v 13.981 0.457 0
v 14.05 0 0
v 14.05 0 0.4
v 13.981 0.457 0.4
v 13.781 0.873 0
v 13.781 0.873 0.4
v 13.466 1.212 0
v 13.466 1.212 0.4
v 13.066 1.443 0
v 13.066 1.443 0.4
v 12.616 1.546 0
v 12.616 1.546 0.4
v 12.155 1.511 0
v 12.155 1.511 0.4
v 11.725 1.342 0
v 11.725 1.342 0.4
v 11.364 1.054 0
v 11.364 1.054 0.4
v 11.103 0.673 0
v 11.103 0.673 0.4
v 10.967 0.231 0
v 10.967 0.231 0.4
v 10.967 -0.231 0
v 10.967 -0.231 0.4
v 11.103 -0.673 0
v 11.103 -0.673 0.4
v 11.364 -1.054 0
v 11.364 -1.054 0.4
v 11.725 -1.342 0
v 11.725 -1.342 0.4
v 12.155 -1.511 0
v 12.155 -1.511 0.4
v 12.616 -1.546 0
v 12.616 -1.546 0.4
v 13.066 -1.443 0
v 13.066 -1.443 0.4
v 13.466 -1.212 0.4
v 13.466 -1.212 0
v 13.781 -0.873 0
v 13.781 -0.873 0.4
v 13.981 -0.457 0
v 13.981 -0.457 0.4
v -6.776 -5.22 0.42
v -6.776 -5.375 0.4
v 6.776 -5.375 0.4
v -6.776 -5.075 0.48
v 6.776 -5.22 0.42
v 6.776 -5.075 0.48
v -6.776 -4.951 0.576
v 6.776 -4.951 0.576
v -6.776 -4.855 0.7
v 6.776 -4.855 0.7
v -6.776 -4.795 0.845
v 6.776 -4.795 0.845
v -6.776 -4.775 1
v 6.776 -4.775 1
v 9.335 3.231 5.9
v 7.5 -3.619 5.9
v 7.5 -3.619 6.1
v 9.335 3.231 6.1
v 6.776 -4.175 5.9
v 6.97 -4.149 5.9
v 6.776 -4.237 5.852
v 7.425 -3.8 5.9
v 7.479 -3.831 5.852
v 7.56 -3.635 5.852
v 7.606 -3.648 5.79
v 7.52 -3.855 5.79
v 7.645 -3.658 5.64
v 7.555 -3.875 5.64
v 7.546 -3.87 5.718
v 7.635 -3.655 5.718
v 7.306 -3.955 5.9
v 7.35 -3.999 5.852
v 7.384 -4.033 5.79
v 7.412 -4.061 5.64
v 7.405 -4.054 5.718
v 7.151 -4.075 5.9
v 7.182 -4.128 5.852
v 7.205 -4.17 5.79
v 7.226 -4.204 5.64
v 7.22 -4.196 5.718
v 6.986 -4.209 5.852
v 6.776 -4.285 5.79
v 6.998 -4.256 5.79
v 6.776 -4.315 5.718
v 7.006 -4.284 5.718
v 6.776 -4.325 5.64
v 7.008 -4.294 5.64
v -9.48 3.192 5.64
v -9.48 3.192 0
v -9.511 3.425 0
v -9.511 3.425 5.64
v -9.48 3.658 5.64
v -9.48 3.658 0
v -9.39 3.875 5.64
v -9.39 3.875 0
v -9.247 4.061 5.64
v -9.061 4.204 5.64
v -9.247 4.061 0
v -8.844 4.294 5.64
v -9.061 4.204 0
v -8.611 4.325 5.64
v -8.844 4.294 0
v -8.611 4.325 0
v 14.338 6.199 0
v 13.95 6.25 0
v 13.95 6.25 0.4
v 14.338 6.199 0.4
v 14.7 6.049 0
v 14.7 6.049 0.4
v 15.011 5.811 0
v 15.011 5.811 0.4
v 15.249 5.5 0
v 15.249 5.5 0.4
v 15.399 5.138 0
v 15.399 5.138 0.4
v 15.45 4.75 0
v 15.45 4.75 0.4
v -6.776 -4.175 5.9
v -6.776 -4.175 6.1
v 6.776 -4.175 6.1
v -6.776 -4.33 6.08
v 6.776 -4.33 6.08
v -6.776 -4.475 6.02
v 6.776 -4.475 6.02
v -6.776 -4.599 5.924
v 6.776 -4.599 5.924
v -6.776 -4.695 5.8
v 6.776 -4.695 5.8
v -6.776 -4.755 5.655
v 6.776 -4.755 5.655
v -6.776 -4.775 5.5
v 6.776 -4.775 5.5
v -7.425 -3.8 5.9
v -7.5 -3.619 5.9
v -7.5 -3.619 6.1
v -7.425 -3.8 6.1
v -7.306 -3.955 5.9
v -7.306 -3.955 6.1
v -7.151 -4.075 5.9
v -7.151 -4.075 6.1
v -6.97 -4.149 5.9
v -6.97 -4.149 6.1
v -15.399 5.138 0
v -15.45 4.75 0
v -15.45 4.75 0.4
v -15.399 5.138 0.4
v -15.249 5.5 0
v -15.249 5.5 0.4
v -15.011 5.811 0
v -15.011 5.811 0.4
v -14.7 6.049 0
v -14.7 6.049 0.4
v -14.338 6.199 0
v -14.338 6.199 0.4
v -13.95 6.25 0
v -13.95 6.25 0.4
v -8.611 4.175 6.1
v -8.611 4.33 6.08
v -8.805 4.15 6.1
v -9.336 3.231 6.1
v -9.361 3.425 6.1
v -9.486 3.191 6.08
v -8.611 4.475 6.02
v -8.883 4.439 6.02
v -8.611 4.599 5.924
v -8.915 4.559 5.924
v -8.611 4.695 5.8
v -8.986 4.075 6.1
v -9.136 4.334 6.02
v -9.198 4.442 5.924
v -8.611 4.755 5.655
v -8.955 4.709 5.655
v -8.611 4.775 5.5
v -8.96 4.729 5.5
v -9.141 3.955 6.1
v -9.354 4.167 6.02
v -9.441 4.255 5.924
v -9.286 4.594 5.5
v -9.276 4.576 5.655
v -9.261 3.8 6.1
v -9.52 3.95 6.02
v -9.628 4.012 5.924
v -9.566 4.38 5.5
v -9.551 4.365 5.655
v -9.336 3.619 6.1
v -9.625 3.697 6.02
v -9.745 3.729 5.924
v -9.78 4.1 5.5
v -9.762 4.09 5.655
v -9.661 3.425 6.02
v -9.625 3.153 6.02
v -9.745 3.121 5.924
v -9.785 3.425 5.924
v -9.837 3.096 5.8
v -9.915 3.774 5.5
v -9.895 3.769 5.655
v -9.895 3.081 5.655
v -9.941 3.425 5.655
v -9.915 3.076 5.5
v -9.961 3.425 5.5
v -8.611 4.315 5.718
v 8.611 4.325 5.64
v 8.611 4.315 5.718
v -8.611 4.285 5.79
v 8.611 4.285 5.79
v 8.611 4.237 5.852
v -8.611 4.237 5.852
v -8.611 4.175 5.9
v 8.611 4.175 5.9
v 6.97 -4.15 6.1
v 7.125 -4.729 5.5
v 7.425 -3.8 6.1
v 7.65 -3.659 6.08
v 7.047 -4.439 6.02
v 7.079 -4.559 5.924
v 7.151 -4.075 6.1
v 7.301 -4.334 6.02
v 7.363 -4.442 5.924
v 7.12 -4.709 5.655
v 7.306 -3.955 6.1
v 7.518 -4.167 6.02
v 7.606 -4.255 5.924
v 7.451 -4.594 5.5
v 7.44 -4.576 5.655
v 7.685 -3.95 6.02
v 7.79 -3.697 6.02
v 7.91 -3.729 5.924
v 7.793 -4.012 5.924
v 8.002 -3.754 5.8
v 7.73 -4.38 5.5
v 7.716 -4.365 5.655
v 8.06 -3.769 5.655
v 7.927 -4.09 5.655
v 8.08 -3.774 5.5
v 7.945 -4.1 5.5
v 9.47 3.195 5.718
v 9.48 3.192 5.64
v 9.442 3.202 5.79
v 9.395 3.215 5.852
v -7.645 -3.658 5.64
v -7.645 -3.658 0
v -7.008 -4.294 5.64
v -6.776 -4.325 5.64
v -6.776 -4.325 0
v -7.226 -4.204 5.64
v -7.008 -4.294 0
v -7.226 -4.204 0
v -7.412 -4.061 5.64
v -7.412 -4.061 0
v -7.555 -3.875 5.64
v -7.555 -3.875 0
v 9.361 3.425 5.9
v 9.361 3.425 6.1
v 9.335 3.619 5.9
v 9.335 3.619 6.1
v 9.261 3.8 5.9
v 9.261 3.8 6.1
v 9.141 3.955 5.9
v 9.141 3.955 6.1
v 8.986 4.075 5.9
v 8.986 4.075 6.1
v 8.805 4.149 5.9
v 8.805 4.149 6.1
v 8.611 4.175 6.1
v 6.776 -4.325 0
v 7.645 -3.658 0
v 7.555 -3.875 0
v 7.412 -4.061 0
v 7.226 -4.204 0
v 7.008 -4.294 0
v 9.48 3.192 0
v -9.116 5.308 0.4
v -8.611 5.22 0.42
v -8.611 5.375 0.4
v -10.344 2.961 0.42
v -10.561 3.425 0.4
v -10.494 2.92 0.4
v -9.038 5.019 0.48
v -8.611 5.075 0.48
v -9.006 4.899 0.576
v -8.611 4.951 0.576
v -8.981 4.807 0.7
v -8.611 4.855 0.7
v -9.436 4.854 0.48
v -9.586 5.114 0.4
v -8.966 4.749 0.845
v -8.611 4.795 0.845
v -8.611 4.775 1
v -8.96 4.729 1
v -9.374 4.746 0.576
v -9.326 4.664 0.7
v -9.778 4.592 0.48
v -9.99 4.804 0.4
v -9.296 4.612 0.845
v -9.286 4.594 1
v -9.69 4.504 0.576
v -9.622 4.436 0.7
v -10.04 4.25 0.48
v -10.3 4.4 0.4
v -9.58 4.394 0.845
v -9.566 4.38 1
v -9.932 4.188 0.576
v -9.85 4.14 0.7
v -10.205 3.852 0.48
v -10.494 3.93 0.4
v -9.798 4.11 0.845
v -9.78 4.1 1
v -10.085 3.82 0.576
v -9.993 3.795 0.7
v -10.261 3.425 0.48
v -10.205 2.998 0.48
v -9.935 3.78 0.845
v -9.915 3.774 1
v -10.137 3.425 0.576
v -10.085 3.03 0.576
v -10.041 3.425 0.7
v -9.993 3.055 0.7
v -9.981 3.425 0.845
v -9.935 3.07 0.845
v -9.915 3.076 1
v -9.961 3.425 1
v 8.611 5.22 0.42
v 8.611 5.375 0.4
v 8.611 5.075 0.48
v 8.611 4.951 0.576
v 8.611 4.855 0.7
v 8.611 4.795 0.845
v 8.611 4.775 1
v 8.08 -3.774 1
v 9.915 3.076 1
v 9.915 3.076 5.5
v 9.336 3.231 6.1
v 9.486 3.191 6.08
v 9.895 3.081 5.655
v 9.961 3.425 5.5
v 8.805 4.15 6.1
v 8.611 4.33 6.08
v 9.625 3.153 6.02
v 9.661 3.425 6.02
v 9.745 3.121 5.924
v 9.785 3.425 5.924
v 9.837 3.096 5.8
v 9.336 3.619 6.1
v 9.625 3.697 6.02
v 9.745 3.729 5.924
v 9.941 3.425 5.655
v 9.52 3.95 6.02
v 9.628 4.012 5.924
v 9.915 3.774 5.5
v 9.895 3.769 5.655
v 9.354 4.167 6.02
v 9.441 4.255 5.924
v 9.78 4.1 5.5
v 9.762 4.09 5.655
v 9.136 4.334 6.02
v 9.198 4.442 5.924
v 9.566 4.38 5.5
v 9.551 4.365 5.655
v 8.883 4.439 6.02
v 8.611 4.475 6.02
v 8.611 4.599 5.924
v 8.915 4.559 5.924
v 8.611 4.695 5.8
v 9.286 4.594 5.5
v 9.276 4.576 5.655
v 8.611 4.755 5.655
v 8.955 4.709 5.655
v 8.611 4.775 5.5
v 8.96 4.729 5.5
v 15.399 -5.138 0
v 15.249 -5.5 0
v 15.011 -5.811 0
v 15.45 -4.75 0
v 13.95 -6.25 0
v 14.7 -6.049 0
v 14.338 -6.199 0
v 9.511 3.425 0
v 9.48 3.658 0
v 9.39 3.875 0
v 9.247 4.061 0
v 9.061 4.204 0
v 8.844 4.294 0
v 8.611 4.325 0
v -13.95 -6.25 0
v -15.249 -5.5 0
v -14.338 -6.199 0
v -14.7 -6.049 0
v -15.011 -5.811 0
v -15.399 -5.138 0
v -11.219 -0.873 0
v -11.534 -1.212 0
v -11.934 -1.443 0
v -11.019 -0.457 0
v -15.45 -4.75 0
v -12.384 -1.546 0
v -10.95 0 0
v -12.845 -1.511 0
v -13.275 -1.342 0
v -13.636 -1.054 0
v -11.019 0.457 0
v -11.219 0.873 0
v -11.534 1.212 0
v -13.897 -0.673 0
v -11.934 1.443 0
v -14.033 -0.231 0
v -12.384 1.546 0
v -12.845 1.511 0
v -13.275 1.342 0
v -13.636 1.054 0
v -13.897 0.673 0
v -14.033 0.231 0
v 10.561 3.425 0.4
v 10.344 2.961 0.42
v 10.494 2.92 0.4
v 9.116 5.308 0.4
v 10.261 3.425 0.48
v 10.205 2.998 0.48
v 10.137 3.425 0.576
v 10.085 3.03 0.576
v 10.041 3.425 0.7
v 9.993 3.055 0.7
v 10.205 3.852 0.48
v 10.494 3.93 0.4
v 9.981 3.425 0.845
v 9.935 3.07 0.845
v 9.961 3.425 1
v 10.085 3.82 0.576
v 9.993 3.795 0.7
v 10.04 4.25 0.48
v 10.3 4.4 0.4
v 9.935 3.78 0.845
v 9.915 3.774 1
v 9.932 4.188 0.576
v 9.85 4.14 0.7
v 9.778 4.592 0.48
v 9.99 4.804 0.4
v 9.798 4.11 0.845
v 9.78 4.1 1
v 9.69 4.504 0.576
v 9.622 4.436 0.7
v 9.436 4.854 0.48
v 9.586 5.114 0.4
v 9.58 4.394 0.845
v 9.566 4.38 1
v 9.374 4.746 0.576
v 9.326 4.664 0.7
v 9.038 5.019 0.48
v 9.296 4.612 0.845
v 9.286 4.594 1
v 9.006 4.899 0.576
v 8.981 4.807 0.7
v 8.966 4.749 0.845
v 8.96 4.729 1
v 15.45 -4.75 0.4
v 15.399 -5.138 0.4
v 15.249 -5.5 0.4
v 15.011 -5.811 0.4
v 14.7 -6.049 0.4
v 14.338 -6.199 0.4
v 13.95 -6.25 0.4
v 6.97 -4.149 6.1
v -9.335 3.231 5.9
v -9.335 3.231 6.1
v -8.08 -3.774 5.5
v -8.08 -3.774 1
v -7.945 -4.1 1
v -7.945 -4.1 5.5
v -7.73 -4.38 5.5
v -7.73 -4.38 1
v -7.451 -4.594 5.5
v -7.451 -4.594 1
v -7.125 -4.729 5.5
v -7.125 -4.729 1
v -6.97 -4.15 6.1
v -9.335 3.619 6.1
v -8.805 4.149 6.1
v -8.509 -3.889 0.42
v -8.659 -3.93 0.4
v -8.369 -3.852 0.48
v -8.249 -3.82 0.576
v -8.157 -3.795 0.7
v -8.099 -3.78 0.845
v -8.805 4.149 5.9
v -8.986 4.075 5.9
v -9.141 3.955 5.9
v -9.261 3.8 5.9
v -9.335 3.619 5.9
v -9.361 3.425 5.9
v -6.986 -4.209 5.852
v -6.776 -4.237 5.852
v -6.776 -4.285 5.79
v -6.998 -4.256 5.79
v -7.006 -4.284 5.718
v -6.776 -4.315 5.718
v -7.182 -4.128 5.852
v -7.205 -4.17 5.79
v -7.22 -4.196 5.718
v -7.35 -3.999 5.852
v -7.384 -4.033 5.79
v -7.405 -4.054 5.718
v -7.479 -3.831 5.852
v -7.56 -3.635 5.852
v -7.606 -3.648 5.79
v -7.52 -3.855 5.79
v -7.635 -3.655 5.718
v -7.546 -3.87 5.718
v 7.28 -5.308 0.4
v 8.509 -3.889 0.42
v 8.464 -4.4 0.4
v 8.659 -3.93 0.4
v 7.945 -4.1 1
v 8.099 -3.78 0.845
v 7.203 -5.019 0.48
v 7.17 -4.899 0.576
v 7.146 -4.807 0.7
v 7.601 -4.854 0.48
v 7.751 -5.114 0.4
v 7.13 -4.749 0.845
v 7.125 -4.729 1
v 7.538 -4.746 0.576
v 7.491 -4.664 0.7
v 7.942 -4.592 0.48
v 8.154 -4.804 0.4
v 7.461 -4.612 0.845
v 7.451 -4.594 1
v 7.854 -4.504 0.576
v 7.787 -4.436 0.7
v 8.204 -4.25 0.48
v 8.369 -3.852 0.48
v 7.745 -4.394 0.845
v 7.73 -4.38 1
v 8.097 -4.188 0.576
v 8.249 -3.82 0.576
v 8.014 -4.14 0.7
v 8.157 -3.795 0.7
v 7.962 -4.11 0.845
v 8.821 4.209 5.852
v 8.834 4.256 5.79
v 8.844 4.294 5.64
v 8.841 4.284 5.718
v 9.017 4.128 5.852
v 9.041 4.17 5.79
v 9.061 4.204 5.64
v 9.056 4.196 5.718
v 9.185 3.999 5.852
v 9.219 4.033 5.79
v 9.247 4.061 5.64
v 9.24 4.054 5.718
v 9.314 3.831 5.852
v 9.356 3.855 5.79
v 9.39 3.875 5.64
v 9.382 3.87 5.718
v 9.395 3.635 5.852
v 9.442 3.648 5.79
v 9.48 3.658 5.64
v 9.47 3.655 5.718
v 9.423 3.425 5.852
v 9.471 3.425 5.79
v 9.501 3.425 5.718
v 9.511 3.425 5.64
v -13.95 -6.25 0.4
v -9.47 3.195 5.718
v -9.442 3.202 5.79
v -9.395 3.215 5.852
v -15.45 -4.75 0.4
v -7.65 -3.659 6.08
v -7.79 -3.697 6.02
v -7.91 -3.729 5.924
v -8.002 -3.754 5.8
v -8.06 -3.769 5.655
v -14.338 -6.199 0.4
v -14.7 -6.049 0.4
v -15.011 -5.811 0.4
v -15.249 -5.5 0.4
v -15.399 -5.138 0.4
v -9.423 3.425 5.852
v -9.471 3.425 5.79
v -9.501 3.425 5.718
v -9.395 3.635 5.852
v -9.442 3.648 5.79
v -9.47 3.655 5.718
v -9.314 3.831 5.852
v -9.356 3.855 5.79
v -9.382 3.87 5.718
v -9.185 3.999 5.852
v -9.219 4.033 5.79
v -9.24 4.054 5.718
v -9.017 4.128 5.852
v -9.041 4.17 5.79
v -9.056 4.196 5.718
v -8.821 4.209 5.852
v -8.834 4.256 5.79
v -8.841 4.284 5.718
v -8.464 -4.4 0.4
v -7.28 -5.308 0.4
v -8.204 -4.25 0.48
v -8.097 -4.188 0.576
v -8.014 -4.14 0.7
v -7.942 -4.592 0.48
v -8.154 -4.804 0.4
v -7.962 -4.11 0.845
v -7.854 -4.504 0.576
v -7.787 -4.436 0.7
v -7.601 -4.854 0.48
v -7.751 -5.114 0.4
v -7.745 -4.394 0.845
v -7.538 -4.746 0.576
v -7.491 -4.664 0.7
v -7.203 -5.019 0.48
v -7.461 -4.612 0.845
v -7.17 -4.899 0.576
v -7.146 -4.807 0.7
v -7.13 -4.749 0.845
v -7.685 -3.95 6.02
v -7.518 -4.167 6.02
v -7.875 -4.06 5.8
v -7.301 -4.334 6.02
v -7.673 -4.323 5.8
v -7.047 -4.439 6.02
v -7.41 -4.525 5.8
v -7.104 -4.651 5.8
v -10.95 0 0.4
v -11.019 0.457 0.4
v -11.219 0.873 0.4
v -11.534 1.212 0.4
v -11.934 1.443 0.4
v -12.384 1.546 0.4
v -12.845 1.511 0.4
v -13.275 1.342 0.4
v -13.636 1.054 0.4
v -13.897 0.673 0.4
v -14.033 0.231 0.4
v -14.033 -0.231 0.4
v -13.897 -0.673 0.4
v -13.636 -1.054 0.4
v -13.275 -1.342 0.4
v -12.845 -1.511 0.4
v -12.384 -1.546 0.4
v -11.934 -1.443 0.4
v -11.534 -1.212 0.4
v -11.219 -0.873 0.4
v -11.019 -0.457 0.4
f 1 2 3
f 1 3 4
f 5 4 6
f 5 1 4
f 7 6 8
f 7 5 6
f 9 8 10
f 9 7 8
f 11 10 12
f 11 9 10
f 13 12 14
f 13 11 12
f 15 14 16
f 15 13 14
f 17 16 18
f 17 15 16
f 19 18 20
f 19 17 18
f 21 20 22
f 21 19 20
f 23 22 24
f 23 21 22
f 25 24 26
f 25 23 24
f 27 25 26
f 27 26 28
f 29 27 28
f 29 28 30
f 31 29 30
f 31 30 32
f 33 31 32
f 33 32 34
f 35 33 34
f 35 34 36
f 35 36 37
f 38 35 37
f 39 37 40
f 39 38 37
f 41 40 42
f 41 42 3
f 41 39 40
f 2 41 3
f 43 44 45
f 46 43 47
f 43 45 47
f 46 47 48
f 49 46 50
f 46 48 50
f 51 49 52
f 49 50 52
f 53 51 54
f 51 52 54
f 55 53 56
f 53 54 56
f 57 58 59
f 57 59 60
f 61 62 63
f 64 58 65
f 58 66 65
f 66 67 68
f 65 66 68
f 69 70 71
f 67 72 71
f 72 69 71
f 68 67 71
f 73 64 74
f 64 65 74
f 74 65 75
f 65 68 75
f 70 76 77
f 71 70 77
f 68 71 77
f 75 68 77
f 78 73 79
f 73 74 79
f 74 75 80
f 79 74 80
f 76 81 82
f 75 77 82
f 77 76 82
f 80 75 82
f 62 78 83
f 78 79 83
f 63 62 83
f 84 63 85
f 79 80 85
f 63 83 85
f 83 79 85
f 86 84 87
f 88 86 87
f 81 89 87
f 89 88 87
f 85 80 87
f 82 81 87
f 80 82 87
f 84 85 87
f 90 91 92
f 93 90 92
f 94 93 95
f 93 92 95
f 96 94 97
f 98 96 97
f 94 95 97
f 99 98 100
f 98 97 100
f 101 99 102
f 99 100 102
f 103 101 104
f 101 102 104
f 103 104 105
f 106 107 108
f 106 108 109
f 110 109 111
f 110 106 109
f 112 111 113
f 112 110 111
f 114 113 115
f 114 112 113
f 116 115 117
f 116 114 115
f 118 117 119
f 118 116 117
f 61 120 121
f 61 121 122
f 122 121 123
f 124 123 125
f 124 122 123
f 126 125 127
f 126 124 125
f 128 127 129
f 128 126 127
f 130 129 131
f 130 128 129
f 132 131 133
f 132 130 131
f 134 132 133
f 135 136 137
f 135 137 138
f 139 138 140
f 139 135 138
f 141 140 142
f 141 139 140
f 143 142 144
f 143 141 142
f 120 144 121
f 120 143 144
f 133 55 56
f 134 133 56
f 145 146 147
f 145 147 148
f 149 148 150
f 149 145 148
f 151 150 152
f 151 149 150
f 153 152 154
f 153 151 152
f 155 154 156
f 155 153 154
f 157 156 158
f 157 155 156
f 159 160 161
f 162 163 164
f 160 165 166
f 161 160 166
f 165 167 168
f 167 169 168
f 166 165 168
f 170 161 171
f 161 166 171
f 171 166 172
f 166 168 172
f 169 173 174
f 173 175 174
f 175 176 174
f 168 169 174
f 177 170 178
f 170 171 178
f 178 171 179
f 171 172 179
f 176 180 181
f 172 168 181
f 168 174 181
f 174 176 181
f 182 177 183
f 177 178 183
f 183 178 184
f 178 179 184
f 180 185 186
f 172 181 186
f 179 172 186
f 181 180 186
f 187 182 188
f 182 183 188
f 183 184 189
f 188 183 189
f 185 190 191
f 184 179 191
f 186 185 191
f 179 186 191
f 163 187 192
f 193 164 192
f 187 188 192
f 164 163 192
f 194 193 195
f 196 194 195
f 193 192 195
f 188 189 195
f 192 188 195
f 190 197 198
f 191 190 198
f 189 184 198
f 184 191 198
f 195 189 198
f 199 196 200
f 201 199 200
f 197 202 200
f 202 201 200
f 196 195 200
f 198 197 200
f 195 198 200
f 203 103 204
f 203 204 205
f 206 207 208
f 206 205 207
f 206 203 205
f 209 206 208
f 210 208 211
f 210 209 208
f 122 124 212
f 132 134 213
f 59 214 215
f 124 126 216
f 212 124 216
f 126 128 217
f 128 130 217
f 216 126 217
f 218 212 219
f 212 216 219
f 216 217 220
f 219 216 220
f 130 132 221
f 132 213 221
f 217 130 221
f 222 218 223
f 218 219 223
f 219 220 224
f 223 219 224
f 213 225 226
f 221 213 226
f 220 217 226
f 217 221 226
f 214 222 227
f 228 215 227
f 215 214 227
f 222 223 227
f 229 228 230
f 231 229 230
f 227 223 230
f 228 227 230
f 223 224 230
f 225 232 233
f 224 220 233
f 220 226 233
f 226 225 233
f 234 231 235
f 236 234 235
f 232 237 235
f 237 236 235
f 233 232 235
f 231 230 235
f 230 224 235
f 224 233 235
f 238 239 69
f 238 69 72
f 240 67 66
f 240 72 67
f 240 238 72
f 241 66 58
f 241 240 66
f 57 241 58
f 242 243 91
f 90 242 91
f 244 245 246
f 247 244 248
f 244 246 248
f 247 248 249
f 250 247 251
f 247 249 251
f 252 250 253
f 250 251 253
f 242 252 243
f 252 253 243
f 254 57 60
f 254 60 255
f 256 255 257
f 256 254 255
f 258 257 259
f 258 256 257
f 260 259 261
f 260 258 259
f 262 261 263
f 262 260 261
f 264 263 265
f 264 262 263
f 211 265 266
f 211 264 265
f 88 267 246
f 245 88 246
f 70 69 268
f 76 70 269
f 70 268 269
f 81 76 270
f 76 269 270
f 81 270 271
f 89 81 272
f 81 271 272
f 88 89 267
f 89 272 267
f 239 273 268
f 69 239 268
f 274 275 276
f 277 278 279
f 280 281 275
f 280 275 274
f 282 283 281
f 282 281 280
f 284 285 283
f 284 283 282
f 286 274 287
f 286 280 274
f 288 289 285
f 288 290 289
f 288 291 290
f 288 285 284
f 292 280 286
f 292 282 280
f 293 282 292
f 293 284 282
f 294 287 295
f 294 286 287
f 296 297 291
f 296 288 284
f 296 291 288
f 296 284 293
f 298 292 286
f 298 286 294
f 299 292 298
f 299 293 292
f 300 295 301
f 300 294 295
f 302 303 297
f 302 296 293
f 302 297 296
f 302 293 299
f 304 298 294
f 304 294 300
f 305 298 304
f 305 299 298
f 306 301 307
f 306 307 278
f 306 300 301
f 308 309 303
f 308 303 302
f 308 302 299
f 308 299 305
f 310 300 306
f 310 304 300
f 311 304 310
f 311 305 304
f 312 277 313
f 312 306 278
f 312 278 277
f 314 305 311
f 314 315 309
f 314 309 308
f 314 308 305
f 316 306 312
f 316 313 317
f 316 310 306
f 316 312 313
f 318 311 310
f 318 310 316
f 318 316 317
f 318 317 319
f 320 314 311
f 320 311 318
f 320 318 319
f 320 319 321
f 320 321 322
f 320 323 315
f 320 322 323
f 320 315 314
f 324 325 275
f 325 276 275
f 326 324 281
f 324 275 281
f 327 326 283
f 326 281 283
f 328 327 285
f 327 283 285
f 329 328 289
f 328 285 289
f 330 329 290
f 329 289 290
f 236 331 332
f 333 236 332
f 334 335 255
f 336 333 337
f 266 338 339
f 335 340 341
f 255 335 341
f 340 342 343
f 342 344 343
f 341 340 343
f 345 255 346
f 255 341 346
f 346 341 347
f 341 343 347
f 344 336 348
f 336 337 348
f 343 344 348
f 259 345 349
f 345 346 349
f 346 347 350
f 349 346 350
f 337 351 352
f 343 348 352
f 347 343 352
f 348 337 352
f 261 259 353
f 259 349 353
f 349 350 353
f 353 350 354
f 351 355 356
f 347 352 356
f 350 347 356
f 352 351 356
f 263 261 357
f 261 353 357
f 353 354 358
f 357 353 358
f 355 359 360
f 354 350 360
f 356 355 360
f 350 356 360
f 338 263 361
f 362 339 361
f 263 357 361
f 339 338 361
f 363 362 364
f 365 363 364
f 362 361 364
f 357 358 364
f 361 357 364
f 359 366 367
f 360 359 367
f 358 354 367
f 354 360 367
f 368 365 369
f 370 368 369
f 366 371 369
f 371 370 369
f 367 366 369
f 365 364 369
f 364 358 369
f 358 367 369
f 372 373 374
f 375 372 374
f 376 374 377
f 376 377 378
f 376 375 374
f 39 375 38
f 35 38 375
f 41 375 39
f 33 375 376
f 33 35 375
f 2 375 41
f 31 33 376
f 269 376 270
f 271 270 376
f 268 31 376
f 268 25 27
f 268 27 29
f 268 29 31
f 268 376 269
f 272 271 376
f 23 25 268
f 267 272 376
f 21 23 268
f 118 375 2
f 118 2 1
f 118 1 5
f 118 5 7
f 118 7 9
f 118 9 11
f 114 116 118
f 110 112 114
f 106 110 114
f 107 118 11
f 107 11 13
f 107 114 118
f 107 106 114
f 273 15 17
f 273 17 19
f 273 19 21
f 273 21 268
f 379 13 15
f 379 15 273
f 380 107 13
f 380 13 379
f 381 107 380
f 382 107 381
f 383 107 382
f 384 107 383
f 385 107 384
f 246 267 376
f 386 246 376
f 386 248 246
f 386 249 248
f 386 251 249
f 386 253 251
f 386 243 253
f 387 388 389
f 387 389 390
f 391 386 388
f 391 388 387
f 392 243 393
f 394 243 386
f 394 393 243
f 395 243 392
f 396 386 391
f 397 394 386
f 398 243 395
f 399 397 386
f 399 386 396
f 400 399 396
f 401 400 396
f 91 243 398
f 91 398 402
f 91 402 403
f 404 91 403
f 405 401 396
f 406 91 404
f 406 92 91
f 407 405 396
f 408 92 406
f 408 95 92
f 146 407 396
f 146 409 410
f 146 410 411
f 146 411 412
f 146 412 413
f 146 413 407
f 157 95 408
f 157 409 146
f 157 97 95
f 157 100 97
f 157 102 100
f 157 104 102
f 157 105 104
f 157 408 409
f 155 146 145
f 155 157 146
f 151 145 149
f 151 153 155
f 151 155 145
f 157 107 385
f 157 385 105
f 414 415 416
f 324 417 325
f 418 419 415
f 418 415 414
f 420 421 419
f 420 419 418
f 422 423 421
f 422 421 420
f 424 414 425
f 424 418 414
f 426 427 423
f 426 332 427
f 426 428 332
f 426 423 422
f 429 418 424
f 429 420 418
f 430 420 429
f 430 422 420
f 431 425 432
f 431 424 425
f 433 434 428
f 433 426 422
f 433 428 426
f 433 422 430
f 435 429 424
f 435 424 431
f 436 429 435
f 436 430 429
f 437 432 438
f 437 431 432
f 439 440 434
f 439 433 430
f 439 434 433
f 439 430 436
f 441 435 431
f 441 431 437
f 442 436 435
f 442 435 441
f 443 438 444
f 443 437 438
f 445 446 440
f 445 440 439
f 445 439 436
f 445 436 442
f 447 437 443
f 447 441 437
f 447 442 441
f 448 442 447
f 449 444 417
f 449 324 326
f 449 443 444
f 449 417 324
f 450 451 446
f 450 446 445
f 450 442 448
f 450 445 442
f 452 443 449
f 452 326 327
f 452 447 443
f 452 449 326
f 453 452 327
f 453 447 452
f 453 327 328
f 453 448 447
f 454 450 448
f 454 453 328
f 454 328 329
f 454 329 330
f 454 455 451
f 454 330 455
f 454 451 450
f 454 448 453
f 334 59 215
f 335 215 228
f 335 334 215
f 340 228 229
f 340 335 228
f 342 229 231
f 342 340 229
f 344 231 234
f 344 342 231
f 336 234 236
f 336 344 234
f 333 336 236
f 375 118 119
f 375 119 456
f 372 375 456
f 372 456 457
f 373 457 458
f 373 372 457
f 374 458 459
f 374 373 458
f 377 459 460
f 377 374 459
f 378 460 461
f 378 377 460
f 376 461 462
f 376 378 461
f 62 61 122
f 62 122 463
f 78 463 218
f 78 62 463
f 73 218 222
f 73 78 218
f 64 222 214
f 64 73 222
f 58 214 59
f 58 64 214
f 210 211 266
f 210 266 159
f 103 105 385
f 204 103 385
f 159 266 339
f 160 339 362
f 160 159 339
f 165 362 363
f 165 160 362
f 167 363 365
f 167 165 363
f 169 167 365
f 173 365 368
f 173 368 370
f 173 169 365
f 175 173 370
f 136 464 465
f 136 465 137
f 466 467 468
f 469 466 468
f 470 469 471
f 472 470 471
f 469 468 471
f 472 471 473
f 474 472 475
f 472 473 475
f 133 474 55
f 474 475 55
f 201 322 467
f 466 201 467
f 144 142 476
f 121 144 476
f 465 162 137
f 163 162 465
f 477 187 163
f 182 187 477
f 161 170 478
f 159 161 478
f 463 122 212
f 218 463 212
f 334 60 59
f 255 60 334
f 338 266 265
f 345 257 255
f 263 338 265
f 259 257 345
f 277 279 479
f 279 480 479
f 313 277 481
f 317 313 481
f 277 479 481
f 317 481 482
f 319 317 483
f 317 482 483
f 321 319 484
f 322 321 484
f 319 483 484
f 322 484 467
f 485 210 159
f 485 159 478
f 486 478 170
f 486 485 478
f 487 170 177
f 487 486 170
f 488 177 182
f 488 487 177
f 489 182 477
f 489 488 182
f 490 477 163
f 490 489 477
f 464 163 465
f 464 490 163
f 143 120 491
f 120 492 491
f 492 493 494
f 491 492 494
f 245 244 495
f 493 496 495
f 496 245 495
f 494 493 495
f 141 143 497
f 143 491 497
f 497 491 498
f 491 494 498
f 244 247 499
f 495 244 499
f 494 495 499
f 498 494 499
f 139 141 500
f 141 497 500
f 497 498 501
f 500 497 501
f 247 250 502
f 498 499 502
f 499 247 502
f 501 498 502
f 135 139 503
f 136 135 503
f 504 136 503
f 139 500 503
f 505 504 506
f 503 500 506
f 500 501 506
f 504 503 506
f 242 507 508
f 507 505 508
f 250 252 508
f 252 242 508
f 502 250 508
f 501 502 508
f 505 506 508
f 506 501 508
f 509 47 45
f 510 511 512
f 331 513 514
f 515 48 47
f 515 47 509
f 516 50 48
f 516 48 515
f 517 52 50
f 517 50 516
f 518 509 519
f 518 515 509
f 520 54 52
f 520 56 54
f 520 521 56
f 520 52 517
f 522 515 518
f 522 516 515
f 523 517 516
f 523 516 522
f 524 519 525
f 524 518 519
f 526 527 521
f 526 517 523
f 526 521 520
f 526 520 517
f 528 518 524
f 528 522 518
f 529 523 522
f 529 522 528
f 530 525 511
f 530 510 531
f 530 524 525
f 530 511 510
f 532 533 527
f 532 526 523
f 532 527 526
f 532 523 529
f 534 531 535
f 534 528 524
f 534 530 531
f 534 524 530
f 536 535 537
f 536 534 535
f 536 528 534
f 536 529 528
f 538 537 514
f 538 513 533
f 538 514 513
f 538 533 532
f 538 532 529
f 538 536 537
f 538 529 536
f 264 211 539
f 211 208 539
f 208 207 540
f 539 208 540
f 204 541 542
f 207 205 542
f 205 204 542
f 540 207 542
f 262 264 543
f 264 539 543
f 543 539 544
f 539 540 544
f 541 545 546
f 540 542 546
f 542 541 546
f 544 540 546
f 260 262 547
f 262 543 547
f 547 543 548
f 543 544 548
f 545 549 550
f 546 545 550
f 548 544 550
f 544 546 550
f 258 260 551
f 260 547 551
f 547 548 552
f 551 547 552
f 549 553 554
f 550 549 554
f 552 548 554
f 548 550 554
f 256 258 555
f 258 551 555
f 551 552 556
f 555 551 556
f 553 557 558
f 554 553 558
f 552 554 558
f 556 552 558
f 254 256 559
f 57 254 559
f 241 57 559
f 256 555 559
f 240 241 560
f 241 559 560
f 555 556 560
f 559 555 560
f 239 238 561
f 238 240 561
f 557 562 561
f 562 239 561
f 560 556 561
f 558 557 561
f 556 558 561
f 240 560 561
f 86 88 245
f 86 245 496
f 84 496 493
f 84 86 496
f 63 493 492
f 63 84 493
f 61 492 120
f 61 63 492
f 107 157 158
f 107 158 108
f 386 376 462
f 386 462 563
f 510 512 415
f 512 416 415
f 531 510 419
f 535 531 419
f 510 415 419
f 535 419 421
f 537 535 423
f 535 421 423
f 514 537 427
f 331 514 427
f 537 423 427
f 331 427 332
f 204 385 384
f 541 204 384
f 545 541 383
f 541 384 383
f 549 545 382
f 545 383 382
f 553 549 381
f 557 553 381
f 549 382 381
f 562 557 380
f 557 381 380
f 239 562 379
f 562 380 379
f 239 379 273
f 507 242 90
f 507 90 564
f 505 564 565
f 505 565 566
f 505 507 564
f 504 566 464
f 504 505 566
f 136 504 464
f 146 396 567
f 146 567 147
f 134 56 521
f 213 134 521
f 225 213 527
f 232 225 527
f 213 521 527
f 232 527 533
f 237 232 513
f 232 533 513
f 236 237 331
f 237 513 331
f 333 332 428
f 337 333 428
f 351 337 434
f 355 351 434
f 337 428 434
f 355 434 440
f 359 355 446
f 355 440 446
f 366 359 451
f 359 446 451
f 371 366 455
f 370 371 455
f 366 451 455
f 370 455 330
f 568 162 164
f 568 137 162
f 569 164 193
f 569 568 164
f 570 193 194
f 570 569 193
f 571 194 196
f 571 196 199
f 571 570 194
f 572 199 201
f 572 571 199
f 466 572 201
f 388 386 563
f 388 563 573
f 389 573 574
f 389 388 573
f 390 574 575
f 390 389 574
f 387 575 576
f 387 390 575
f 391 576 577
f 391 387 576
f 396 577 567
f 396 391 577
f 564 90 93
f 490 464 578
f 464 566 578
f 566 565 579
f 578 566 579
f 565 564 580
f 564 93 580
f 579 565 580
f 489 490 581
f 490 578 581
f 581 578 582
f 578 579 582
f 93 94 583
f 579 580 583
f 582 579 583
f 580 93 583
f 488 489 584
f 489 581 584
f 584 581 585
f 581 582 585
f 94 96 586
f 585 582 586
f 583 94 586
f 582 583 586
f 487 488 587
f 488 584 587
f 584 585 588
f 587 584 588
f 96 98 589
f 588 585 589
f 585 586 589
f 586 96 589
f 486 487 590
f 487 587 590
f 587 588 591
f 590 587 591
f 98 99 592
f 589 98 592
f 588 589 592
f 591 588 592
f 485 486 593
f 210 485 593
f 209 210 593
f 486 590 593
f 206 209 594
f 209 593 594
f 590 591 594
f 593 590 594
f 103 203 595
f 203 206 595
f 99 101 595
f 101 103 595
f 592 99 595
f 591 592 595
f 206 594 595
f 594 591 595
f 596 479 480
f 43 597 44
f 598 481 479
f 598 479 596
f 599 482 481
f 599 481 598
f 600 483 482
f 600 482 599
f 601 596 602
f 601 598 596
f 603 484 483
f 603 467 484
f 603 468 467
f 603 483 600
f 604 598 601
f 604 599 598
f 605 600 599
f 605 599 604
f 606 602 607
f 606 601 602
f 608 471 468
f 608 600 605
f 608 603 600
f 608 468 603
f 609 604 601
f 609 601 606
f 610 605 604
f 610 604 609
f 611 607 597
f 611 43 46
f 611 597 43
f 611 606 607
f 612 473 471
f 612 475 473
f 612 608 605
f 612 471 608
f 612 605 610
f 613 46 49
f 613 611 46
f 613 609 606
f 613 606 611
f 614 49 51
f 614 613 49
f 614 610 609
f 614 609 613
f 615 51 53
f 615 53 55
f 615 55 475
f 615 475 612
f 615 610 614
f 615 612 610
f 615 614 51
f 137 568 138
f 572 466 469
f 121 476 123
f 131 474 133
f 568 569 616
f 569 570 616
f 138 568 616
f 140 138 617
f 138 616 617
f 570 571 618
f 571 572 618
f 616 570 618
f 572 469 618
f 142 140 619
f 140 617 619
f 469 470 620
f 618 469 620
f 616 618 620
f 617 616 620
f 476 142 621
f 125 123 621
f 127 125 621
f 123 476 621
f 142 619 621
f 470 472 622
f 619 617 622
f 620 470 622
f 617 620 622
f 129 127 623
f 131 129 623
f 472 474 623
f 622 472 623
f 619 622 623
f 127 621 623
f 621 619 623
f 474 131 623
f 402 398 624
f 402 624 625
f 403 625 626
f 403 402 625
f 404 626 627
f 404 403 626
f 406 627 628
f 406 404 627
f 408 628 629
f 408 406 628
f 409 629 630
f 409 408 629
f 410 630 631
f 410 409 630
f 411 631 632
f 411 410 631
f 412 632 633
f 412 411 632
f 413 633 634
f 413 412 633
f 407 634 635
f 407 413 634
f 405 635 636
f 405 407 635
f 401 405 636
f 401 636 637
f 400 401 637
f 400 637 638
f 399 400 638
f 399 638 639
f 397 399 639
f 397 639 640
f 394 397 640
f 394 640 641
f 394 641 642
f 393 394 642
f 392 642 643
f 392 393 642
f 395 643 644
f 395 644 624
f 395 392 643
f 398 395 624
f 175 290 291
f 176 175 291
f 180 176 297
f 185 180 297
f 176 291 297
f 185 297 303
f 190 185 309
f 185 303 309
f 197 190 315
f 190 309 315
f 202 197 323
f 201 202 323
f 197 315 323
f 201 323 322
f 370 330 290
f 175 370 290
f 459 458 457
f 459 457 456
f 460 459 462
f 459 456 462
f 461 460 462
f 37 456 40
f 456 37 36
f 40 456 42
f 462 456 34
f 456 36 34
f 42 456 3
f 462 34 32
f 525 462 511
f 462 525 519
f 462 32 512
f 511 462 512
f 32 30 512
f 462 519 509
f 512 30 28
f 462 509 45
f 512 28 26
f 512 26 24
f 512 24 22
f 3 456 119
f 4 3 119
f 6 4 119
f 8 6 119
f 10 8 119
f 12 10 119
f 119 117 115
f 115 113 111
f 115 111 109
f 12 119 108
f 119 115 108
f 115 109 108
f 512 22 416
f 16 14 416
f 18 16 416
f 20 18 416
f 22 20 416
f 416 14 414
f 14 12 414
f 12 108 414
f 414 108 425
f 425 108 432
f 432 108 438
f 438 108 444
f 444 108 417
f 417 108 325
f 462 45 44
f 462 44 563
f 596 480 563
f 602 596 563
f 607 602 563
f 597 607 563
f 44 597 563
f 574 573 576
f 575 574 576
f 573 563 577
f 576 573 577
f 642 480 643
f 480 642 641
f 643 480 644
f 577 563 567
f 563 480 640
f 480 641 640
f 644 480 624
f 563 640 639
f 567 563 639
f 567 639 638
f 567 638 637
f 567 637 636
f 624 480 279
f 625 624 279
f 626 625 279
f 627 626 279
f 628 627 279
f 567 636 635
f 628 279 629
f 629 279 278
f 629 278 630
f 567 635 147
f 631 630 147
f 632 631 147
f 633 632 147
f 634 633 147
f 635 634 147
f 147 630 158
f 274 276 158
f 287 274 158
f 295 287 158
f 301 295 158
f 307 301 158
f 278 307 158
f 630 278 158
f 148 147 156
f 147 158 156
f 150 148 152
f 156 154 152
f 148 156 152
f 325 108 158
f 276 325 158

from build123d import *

# Parameters (mm, degrees)
SKETCH1_R           = 1.55
BOSS_EXTRUDE1_DEPTH = 0.4
BOSS_EXTRUDE2_DEPTH = 5.7
FILLET1_R           = 0.6
CUT_EXTRUDE1_DEPTH  = 5.9
FILLET2_R           = 0.3


# Some blends are built 0.0001 mm under size
with BuildPart() as part:
    # Sketch1 → Boss-Extrude1 (new body)
    with BuildSketch(Plane.XY):
        with BuildLine():
            Line((-13.95, 6.25), (13.95, 6.25))
            ThreePointArc((13.95, 6.25), (15.010660172, 5.810660172), (15.45, 4.75))
            Line((15.45, 4.75), (15.45, -4.75))
            ThreePointArc((15.45, -4.75), (15.010660172, -5.810660172), (13.95, -6.25))
            Line((13.95, -6.25), (-13.95, -6.25))
            ThreePointArc((-13.95, -6.25), (-15.010660172, -5.810660172), (-15.45, -4.75))
            Line((-15.45, -4.75), (-15.45, 4.75))
            ThreePointArc((-15.45, 4.75), (-15.010660172, 5.810660172), (-13.95, 6.25))
        make_face()
        with Locations((-12.5, 0)):
            Circle(SKETCH1_R, mode=Mode.SUBTRACT)
        with Locations((12.5, 0)):
            Circle(SKETCH1_R, mode=Mode.SUBTRACT)
        with BuildLine():
            Line((-8.611007598, 4.175), (8.611007598, 4.175))
            ThreePointArc((8.611007598, 4.175), (9.206022604, 3.881571072), (9.335451968, 3.230885716))
            Line((9.335451968, 3.230885716), (7.5, -3.619114284))
            ThreePointArc((7.5, -3.619114284), (7.232126702, -4.020015005), (6.77555563, -4.175))
            Line((6.77555563, -4.175), (-6.77555563, -4.175))
            ThreePointArc((-6.77555563, -4.175), (-7.232126702, -4.020015005), (-7.5, -3.619114284))
            Line((-7.5, -3.619114284), (-9.335451968, 3.230885716))
            ThreePointArc((-9.335451968, 3.230885716), (-9.206022604, 3.881571072), (-8.611007598, 4.175))
        make_face(mode=Mode.SUBTRACT)
    extrude(amount=BOSS_EXTRUDE1_DEPTH)

    # Sketch2 → Boss-Extrude2 (add)
    with BuildSketch(Plane.XY.offset(0.4)):
        with BuildLine():
            Line((-6.77555563, -4.775), (6.77555563, -4.775))
            ThreePointArc((6.77555563, -4.775), (7.597383559, -4.496027009), (8.079555496, -3.774405711))
            Line((8.079555496, -3.774405711), (9.915007464, 3.075594289))
            ThreePointArc((9.915007464, 3.075594289), (9.682034608, 4.246827929), (8.611007598, 4.775))
            Line((8.611007598, 4.775), (-8.611007598, 4.775))
            ThreePointArc((-8.611007598, 4.775), (-9.682034608, 4.246827929), (-9.915007464, 3.075594289))
            Line((-9.915007464, 3.075594289), (-8.079555496, -3.774405711))
            ThreePointArc((-8.079555496, -3.774405711), (-7.597383559, -4.496027009), (-6.77555563, -4.775))
        make_face()
        with BuildLine():
            Line((-6.77555563, -4.175), (6.77555563, -4.175))
            ThreePointArc((6.77555563, -4.175), (7.232126702, -4.020015005), (7.5, -3.619114284))
            Line((7.5, -3.619114284), (9.335451968, 3.230885716))
            ThreePointArc((9.335451968, 3.230885716), (9.206022604, 3.881571072), (8.611007598, 4.175))
            Line((8.611007598, 4.175), (-8.611007598, 4.175))
            ThreePointArc((-8.611007598, 4.175), (-9.206022604, 3.881571072), (-9.335451968, 3.230885716))
            Line((-9.335451968, 3.230885716), (-7.5, -3.619114284))
            ThreePointArc((-7.5, -3.619114284), (-7.232126702, -4.020015005), (-6.77555563, -4.175))
        make_face(mode=Mode.SUBTRACT)
    extrude(amount=BOSS_EXTRUDE2_DEPTH)

    # Fillet1
    fillet1_edges = [part.edges().sort_by_distance(p)[0] for p in [
        (-7.597383559, -4.496027009, 6.1),
        (0, -4.775, 6.1),
        (7.597383559, -4.496027009, 6.1),
        (8.99728148, -0.349405711, 6.1),
        (9.682034608, 4.246827929, 6.1),
        (0, 4.775, 6.1),
        (-9.682034608, 4.246827929, 6.1),
        (-8.99728148, -0.349405711, 6.1),
        (-7.597383559, -4.496027009, 0.4),
        (0, -4.775, 0.4),
        (7.597383559, -4.496027009, 0.4),
        (8.99728148, -0.349405711, 0.4),
        (9.682034608, 4.246827929, 0.4),
        (0, 4.775, 0.4),
        (-9.682034608, 4.246827929, 0.4),
        (-8.99728148, -0.349405711, 0.4),
    ]]
    fillet(fillet1_edges, radius=FILLET1_R - 0.0001)  # a hair under: the kernel refuses the full size

    # Sketch3 → Cut-Extrude1 (cut)
    with BuildSketch(Plane(origin=(0, 0, 0), x_dir=(-1, 0, 0), z_dir=(0, 0, -1))):
        with BuildLine():
            Line((-6.77555563, -4.325), (6.77555563, -4.325))
            ThreePointArc((6.77555563, -4.325), (7.323440916, -4.139018006), (7.644888874, -3.657937141))
            Line((7.644888874, -3.657937141), (9.480340842, 3.192062859))
            ThreePointArc((9.480340842, 3.192062859), (9.325025605, 3.972885286), (8.611007598, 4.325))
            Line((8.611007598, 4.325), (-8.611007598, 4.325))
            ThreePointArc((-8.611007598, 4.325), (-9.325025605, 3.972885286), (-9.480340842, 3.192062859))
            Line((-9.480340842, 3.192062859), (-7.644888874, -3.657937141))
            ThreePointArc((-7.644888874, -3.657937141), (-7.323440916, -4.139018006), (-6.77555563, -4.325))
        make_face()
    extrude(amount=-CUT_EXTRUDE1_DEPTH, mode=Mode.SUBTRACT)

    # Fillet2
    # the kernel refuses this fillet: 0.3 mm, written as the material it adds along each edge
    with BuildSketch(Plane(origin=(6.77555563, -3.425, 5.9), x_dir=(0.9659258262890676, -0.2588190451025228, 0), z_dir=(0.2588190451025228, 0.9659258262890676, 0))) as fillet2_piece_1:
        with BuildLine():
            CenterArc((0.6, 0.259807621), FILLET2_R, 300, 60)
            Line((0.75, 0), (0.753, -0.005196152))
            ThreePointArc((0.753, -0.005196152), (0.825, -0.006), (0.9, -0.006))
            Line((0.9, -0.006), (0.906, 0))
            Line((0.906, 0), (0.906, 0.259807621))
            Line((0.906, 0.259807621), (0.9, 0.259807621))
        make_face()
    revolve(axis=Axis((6.77555563, -3.425, 5.9), (0, 0, -1)), revolution_arc=75)
    with BuildSketch(Plane(origin=(9.480340842, 3.192062859, 5.9), x_dir=(0, 0, -1), z_dir=(-0.25881904510252507, -0.9659258262890672, 0)), Plane(origin=(-7.644888874, -3.657937141, 5.9), x_dir=(0, 0, -1), z_dir=(-0.25881904510252135, 0.9659258262890682, 0))) as fillet2_piece_2:
        with BuildLine():
            CenterArc((0.259807621, -0.3), FILLET2_R, 90, 60)
            Line((0, -0.15), (-0.005196152, -0.147))
            ThreePointArc((-0.005196152, -0.147), (-0.006, -0.075), (-0.006, 0))
            Line((-0.006, 0), (0, 0.006))
            Line((0, 0.006), (0.259807621, 0.006))
            Line((0.259807621, 0.006), (0.259807621, 0))
        make_face()
    extrude(amount=7.091641836)
    with BuildSketch(Plane(origin=(8.611007598, 3.425, 5.9), x_dir=(0, 1, 0), z_dir=(-1, 0, 0))) as fillet2_piece_3:
        with BuildLine():
            CenterArc((0.6, 0.259807621), FILLET2_R, 300, 60)
            Line((0.75, 0), (0.753, -0.005196152))
            ThreePointArc((0.753, -0.005196152), (0.825, -0.006), (0.9, -0.006))
            Line((0.9, -0.006), (0.906, 0))
            Line((0.906, 0), (0.906, 0.259807621))
            Line((0.906, 0.259807621), (0.9, 0.259807621))
        make_face()
    revolve(axis=Axis((8.611007598, 3.425, 5.9), (0, 0, -1)), revolution_arc=105)
    with BuildSketch(Plane(origin=(-8.611007598, 4.325, 5.9), x_dir=(0, 0, -1), z_dir=(1, 0, 0))) as fillet2_piece_4:
        with BuildLine():
            CenterArc((0.259807621, -0.3), FILLET2_R, 90, 60)
            Line((0, -0.15), (-0.005196152, -0.147))
            ThreePointArc((-0.005196152, -0.147), (-0.006, -0.075), (-0.006, 0))
            Line((-0.006, 0), (0, 0.006))
            Line((0, 0.006), (0.259807621, 0.006))
            Line((0.259807621, 0.006), (0.259807621, 0))
        make_face()
    extrude(amount=17.222015197)
    with BuildSketch(Plane(origin=(-8.611007598, 3.425, 5.9), x_dir=(-0.9659258262890688, -0.25881904510251935, 0), z_dir=(0.25881904510251935, -0.9659258262890688, 0))) as fillet2_piece_5:
        with BuildLine():
            CenterArc((0.6, 0.259807621), FILLET2_R, 300, 60)
            Line((0.75, 0), (0.753, -0.005196152))
            ThreePointArc((0.753, -0.005196152), (0.825, -0.006), (0.9, -0.006))
            Line((0.9, -0.006), (0.906, 0))
            Line((0.906, 0), (0.906, 0.259807621))
            Line((0.906, 0.259807621), (0.9, 0.259807621))
        make_face()
    revolve(axis=Axis((-8.611007598, 3.425, 5.9), (0, 0, -1)), revolution_arc=105)
    with BuildSketch(Plane(origin=(-6.77555563, -3.425, 5.9), x_dir=(0, -1, 0), z_dir=(1, 0, 0))) as fillet2_piece_6:
        with BuildLine():
            CenterArc((0.6, 0.259807621), FILLET2_R, 300, 60)
            Line((0.75, 0), (0.753, -0.005196152))
            ThreePointArc((0.753, -0.005196152), (0.825, -0.006), (0.9, -0.006))
            Line((0.9, -0.006), (0.906, 0))
            Line((0.906, 0), (0.906, 0.259807621))
            Line((0.906, 0.259807621), (0.9, 0.259807621))
        make_face()
    revolve(axis=Axis((-6.77555563, -3.425, 5.9), (0, 0, -1)), revolution_arc=75)
    with BuildSketch(Plane(origin=(6.77555563, -4.325, 5.9), x_dir=(0, 0, -1), z_dir=(-1, 0, 0))) as fillet2_piece_7:
        with BuildLine():
            CenterArc((0.259807621, -0.3), FILLET2_R, 90, 60)
            Line((0, -0.15), (-0.005196152, -0.147))
            ThreePointArc((-0.005196152, -0.147), (-0.006, -0.075), (-0.006, 0))
            Line((-0.006, 0), (0, 0.006))
            Line((0, 0.006), (0.259807621, 0.006))
            Line((0.259807621, 0.006), (0.259807621, 0))
        make_face()
    extrude(amount=13.551111261)


solid = part.part
